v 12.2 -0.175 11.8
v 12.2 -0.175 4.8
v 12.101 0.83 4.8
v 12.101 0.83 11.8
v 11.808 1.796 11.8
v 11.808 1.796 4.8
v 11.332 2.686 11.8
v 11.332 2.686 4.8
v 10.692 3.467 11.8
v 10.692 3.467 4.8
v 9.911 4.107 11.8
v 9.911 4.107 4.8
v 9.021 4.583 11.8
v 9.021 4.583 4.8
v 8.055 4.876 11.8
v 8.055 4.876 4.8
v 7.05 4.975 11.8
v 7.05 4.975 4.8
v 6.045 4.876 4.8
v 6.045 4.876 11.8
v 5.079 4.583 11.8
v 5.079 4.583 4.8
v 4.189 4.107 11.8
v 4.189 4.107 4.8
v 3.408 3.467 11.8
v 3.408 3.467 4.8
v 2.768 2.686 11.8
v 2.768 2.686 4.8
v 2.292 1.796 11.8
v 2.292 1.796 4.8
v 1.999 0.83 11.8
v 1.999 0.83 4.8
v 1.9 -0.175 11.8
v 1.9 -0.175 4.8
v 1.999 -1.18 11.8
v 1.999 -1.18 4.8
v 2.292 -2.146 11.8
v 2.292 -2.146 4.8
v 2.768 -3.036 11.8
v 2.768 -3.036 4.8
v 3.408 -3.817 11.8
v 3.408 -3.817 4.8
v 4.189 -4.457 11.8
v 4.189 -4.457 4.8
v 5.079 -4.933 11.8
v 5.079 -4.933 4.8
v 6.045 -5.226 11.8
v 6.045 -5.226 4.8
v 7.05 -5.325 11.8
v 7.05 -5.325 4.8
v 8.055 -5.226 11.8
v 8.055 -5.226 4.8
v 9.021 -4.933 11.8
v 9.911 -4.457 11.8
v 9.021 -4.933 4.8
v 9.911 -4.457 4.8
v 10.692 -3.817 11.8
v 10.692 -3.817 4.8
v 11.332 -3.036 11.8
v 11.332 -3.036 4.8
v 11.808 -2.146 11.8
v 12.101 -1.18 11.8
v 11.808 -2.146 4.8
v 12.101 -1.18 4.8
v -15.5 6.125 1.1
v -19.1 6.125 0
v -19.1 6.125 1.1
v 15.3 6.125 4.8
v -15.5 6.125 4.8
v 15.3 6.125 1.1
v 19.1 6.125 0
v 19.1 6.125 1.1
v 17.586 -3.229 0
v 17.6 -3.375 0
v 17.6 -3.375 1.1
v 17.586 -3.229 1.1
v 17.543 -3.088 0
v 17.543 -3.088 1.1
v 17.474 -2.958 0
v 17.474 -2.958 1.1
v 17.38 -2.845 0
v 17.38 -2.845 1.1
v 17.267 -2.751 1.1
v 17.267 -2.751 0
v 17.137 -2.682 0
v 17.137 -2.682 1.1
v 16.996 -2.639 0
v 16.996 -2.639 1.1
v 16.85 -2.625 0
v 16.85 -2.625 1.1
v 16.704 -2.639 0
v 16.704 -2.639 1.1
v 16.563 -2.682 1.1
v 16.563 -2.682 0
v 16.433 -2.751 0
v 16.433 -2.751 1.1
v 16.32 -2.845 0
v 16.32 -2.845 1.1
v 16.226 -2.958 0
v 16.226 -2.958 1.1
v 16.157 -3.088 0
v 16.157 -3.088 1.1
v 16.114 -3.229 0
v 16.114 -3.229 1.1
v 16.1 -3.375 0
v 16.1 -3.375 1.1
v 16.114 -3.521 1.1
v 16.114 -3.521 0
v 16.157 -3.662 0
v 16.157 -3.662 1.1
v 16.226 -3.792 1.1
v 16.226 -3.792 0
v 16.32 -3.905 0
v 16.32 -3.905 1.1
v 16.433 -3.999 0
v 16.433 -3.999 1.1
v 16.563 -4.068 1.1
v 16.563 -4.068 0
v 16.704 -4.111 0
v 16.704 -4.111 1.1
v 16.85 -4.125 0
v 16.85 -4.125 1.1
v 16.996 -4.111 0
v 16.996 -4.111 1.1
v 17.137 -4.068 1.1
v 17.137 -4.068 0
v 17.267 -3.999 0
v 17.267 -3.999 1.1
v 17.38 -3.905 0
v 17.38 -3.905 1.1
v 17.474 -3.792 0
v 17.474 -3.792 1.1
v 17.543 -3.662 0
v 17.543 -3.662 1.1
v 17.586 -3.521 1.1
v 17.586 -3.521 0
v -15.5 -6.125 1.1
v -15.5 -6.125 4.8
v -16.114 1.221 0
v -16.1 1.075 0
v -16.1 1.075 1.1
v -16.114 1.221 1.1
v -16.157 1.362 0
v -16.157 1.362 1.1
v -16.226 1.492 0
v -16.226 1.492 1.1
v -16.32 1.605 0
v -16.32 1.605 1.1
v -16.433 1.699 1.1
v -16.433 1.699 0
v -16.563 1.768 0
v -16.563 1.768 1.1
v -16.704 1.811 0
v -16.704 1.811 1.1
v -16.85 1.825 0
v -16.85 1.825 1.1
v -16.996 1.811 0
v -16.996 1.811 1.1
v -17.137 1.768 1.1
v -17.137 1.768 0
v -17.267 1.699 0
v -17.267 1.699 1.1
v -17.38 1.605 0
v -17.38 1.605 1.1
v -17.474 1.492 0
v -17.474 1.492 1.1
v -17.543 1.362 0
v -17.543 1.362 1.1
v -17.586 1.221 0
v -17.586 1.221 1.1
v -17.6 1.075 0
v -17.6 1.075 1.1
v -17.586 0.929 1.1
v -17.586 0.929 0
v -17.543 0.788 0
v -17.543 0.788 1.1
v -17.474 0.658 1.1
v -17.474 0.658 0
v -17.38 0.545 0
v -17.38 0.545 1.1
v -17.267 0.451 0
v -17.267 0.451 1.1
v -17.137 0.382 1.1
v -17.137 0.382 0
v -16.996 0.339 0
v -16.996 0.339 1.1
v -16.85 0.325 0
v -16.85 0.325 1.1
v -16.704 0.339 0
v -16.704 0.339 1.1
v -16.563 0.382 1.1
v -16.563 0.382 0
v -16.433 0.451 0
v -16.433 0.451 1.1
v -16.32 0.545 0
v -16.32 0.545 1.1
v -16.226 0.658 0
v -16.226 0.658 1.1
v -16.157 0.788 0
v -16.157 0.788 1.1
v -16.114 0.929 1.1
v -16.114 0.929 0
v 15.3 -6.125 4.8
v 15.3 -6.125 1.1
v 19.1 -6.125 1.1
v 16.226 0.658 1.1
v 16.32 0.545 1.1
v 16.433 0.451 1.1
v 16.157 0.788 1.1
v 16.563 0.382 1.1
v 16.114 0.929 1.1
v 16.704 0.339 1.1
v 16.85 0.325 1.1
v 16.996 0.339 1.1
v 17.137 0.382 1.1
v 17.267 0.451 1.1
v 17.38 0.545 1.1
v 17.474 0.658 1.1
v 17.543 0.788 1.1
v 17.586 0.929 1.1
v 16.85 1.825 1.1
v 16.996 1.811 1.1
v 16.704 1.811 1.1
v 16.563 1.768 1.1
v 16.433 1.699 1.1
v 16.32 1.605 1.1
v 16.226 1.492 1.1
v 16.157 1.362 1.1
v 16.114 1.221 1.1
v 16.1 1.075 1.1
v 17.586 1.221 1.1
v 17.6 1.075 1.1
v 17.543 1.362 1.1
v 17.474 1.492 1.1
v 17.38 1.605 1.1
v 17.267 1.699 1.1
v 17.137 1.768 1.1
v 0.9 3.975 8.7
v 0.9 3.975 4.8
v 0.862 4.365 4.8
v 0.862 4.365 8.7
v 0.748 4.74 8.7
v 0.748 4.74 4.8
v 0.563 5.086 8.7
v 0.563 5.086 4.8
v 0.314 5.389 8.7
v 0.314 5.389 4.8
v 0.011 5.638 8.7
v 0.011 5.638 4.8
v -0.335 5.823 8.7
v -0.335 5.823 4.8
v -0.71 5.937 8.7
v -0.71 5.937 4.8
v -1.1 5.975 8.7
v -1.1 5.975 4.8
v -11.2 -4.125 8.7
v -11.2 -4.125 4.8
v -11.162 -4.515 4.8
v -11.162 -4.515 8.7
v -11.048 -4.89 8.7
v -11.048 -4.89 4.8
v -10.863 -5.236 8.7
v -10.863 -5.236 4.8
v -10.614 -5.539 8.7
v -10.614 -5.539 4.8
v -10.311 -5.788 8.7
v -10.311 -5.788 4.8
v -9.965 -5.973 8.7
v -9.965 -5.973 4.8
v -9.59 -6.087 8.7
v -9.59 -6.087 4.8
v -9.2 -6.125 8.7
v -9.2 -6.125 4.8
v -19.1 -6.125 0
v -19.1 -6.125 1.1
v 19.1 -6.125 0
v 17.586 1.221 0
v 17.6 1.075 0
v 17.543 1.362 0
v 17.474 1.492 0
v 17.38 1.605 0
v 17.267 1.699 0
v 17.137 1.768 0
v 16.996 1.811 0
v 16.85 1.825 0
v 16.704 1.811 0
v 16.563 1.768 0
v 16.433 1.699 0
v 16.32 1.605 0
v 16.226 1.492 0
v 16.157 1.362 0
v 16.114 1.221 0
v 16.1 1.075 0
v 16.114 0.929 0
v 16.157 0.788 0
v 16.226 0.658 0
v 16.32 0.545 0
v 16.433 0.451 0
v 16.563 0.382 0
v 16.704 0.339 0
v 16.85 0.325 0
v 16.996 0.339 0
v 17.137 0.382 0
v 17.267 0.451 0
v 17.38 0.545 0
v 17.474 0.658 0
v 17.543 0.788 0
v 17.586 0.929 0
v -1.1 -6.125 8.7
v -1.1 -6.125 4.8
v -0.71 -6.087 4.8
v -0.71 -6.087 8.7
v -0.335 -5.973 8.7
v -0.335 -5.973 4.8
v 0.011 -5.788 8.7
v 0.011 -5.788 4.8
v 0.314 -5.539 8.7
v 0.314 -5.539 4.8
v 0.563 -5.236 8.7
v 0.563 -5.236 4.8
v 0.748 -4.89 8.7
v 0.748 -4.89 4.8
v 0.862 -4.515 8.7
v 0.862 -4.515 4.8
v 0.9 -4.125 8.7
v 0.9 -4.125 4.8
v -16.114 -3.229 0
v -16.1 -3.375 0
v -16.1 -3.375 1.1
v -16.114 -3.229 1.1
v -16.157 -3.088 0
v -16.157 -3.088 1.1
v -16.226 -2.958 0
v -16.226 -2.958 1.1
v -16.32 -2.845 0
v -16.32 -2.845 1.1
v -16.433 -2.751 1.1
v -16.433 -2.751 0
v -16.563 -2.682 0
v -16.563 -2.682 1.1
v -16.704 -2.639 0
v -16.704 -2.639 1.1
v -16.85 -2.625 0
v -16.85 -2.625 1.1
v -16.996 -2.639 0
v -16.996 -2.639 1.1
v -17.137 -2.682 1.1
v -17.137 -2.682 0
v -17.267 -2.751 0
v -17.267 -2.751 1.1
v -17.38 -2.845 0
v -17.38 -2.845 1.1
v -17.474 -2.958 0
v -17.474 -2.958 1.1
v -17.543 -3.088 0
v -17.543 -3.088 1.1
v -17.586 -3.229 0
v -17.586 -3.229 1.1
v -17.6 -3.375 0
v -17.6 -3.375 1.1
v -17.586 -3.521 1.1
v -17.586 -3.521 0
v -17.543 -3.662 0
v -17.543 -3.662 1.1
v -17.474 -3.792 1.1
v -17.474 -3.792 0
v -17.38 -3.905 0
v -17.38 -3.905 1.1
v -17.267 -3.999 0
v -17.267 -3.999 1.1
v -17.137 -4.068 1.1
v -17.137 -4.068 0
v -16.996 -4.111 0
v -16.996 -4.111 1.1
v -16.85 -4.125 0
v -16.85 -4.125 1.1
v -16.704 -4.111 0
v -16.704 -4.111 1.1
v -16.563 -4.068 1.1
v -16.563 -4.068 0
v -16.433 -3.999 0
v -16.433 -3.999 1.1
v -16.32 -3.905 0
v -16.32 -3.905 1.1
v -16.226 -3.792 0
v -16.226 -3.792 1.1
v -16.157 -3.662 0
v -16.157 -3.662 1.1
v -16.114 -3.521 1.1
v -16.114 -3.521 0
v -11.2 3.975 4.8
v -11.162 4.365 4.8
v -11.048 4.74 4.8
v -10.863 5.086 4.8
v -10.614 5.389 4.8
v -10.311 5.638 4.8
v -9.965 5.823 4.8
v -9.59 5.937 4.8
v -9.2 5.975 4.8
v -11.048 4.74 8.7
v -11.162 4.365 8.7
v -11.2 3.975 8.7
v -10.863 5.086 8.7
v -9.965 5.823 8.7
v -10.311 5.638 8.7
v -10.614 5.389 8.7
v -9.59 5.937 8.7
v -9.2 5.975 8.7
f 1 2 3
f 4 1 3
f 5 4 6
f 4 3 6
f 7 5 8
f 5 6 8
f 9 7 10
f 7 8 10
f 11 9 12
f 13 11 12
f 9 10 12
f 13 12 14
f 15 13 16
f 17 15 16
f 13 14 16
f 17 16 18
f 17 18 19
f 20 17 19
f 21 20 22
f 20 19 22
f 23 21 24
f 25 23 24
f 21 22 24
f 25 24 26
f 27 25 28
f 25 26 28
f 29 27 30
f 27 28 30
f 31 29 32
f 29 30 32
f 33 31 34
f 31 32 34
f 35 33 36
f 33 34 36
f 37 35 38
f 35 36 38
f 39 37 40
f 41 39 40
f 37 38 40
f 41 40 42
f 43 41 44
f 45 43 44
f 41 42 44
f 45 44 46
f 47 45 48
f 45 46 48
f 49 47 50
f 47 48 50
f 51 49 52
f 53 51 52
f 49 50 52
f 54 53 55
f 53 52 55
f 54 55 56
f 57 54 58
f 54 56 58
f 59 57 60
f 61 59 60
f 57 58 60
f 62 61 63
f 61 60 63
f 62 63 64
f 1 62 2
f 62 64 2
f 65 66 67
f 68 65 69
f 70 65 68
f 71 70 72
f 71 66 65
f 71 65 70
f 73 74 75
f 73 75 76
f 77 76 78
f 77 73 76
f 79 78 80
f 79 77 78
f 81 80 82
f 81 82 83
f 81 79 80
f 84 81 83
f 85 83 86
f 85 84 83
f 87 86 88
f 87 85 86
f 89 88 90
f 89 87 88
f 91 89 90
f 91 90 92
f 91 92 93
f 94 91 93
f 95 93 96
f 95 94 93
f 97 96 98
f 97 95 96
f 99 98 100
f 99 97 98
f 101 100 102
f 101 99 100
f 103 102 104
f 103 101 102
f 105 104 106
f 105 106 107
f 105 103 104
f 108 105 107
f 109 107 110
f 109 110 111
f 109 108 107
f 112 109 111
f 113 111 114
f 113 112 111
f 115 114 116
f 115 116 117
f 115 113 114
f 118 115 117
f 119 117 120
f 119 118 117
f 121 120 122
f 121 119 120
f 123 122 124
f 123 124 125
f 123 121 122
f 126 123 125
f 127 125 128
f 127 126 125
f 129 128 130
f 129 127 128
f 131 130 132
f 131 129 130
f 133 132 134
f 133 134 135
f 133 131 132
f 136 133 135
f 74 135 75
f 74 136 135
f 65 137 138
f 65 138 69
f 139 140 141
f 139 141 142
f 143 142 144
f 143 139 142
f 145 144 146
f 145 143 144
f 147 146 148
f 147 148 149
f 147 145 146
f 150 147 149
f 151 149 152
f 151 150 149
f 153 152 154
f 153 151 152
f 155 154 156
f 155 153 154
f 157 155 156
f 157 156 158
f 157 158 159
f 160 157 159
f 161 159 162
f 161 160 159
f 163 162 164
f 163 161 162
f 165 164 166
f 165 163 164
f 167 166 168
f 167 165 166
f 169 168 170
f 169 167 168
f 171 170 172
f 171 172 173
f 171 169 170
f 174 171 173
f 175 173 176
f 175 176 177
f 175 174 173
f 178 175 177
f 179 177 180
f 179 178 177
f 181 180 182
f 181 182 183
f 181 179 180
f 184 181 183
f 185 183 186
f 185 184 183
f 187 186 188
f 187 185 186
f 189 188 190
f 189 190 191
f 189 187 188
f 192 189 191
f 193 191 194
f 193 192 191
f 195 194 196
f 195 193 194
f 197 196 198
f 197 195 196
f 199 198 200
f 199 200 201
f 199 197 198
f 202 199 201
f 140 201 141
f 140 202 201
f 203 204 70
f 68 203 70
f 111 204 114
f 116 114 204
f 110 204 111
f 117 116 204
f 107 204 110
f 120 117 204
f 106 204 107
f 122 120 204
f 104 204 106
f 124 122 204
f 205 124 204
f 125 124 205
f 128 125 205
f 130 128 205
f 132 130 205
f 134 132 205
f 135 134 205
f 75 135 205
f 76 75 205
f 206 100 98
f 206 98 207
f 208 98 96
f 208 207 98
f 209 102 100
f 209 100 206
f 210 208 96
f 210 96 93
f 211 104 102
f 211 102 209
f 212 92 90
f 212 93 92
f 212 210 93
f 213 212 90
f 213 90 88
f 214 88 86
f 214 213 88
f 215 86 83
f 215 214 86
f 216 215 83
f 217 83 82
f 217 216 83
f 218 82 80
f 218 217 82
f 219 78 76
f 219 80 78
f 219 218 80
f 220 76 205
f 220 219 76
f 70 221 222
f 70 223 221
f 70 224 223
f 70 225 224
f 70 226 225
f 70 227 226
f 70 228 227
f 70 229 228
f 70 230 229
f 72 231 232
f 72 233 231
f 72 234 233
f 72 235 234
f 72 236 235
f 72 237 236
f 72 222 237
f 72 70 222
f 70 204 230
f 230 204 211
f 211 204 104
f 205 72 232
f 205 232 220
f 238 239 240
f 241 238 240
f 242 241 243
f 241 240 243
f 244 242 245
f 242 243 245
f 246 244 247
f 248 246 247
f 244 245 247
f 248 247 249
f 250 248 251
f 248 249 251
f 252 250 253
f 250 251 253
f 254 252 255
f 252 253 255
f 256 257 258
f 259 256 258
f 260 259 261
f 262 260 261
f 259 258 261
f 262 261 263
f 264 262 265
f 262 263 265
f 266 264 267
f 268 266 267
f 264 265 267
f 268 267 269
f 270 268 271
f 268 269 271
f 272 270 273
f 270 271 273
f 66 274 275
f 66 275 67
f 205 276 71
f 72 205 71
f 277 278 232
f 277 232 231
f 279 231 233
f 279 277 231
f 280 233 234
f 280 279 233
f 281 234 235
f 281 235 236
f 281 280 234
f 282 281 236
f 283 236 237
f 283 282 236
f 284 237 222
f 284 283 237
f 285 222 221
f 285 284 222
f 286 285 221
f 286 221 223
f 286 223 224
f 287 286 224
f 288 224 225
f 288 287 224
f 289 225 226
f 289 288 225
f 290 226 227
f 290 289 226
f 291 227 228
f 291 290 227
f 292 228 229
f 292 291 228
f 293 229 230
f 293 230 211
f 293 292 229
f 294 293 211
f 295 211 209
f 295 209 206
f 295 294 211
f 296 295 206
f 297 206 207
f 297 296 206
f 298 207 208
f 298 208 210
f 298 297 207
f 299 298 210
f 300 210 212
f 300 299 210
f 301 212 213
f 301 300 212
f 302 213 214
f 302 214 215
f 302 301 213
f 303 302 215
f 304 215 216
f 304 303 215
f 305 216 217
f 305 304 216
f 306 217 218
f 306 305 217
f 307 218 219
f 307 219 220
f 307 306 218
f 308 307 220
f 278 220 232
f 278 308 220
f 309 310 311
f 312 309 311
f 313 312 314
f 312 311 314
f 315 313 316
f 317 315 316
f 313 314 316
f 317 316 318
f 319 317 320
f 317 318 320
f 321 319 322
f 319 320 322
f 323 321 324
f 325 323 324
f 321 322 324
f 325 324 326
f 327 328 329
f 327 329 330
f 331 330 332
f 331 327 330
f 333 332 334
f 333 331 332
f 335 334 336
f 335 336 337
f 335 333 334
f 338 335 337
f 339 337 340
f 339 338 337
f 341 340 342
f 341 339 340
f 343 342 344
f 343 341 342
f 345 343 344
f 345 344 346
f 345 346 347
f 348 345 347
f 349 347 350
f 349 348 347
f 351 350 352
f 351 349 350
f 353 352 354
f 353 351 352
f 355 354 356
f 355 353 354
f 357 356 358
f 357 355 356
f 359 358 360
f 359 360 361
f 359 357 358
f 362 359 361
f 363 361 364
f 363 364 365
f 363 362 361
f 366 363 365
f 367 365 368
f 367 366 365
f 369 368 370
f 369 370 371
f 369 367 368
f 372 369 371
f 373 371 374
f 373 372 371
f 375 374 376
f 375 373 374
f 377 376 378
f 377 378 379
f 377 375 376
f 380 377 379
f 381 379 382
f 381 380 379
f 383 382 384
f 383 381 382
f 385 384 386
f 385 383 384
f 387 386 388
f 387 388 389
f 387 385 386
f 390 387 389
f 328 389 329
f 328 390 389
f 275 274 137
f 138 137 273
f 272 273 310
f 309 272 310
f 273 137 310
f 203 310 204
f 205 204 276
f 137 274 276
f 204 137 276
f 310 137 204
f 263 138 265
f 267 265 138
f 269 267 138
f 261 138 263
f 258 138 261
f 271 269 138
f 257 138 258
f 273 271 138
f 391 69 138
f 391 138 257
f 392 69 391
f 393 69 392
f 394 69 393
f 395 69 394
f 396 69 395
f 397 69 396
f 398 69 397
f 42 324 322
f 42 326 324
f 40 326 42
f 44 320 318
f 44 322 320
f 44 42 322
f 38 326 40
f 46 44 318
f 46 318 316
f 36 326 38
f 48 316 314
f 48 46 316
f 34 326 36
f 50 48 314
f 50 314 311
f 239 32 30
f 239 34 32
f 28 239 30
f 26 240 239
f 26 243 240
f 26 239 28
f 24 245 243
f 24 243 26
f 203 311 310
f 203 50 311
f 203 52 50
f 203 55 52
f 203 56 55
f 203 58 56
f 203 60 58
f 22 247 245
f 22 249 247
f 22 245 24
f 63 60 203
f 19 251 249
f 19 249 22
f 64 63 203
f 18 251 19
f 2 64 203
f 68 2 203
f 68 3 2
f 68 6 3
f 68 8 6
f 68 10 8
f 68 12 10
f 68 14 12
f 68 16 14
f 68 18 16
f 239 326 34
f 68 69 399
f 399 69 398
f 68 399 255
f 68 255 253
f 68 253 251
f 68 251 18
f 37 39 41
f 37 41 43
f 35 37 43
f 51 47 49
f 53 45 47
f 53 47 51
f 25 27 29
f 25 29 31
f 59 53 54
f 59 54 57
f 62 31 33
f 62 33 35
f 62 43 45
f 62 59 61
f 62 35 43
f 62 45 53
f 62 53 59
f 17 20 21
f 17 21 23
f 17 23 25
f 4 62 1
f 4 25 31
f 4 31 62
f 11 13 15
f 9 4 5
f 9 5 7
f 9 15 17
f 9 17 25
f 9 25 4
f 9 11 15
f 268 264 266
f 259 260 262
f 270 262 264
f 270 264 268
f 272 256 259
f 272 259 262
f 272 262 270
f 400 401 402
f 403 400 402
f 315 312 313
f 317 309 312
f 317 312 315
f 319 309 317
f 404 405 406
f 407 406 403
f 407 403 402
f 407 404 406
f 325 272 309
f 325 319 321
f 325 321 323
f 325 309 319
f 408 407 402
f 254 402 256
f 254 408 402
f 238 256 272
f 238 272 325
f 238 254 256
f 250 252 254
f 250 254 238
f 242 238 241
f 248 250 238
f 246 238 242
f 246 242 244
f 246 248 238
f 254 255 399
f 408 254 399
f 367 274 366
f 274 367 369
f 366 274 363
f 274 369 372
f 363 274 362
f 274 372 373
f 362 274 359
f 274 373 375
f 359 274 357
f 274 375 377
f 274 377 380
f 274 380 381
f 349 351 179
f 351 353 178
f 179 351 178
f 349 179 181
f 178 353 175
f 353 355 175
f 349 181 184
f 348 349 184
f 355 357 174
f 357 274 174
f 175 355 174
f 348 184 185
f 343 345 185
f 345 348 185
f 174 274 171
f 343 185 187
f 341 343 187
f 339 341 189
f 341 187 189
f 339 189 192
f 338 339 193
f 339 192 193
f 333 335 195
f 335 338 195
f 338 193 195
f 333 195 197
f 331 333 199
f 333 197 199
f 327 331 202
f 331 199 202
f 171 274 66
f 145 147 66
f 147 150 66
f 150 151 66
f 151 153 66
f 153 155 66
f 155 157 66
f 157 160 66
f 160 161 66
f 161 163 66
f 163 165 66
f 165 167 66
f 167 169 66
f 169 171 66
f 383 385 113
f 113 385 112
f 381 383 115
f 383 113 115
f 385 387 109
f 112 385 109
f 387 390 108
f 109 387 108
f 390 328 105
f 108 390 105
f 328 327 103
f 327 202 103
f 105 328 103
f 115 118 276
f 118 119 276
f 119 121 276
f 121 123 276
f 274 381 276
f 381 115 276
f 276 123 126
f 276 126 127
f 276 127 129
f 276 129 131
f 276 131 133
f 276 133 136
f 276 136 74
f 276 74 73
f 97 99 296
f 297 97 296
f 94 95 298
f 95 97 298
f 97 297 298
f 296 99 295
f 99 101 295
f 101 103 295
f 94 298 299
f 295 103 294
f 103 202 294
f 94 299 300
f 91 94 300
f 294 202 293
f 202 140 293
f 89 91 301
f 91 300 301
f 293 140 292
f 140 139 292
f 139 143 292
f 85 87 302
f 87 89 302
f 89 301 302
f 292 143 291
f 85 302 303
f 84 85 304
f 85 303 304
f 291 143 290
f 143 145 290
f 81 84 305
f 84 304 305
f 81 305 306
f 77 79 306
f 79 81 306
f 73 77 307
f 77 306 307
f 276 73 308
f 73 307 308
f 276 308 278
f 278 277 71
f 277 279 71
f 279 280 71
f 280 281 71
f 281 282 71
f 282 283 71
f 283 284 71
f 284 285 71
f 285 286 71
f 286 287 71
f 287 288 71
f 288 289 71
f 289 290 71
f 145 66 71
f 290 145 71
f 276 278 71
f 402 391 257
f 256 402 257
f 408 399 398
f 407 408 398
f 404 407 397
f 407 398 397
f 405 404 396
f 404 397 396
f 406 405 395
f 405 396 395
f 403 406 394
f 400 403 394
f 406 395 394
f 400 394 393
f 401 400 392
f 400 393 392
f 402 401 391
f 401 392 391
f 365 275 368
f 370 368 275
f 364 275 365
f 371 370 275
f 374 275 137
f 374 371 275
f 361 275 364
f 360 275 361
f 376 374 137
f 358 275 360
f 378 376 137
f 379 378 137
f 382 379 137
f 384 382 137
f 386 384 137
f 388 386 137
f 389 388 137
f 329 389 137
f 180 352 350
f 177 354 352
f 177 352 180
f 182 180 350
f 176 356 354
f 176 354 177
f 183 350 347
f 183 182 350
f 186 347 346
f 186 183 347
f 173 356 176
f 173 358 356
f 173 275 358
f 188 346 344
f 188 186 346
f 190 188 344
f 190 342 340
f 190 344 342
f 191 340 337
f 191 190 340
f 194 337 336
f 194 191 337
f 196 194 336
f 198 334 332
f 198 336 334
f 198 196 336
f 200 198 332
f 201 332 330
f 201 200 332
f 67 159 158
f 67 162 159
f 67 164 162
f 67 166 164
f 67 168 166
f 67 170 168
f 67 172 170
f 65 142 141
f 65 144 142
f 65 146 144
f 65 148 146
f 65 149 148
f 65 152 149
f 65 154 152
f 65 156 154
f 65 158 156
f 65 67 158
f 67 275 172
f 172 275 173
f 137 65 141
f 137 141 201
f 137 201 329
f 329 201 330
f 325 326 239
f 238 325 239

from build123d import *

# Parameters (mm, degrees)
F0_W     = 38.2
F0_H     = 12.25
F0_R     = 0.75
F1_DEPTH = 1.1
F2_W     = 30.8
F2_H     = 12.25
F3_DEPTH = 3.7
F5_DEPTH = 3.9
F4_R     = 5.15
F6_DEPTH = 7


with BuildPart() as f1:
    # F0 (on Top) → F1 (new body)
    with BuildSketch(Plane.XY):
        Rectangle(F0_W, F0_H)
        with Locations((-16.85, -3.375)):
            Circle(F0_R, mode=Mode.SUBTRACT)
        with Locations((16.85, -3.375)):
            Circle(F0_R, mode=Mode.SUBTRACT)
        with Locations((-16.85, 1.075)):
            Circle(F0_R, mode=Mode.SUBTRACT)
        with Locations((16.85, 1.075)):
            Circle(F0_R, mode=Mode.SUBTRACT)
    extrude(amount=F1_DEPTH)

    # F2 (on face) → F3 (join)
    with BuildSketch(Plane.XY.offset(1.1)):
        with Locations((-0.1, 0)):
            Rectangle(F2_W, F2_H)
    extrude(amount=F3_DEPTH)

    # F4 (on face) → F5 (join)
    with BuildSketch(Plane.XY.offset(4.8)):
        with BuildLine():
            Line((-1.1, 5.975), (-9.2, 5.975))
            ThreePointArc((-9.2, 5.975), (-10.614214, 5.389214), (-11.2, 3.975))
            Line((-11.2, 3.975), (-11.2, -4.125))
            ThreePointArc((-11.2, -4.125), (-10.614214, -5.539214), (-9.2, -6.125))
            Line((-9.2, -6.125), (-1.1, -6.125))
            ThreePointArc((-1.1, -6.125), (0.314214, -5.539214), (0.9, -4.125))
            Line((0.9, -4.125), (0.9, 3.975))
            ThreePointArc((0.9, 3.975), (0.314214, 5.389214), (-1.1, 5.975))
        make_face()
    extrude(amount=F5_DEPTH)

    # F4 (on face) → F6 (join)
    with BuildSketch(Plane.XY.offset(4.8)):
        with Locations((7.05, -0.175)):
            Circle(F4_R)
    extrude(amount=F6_DEPTH)


solid = f1.part
